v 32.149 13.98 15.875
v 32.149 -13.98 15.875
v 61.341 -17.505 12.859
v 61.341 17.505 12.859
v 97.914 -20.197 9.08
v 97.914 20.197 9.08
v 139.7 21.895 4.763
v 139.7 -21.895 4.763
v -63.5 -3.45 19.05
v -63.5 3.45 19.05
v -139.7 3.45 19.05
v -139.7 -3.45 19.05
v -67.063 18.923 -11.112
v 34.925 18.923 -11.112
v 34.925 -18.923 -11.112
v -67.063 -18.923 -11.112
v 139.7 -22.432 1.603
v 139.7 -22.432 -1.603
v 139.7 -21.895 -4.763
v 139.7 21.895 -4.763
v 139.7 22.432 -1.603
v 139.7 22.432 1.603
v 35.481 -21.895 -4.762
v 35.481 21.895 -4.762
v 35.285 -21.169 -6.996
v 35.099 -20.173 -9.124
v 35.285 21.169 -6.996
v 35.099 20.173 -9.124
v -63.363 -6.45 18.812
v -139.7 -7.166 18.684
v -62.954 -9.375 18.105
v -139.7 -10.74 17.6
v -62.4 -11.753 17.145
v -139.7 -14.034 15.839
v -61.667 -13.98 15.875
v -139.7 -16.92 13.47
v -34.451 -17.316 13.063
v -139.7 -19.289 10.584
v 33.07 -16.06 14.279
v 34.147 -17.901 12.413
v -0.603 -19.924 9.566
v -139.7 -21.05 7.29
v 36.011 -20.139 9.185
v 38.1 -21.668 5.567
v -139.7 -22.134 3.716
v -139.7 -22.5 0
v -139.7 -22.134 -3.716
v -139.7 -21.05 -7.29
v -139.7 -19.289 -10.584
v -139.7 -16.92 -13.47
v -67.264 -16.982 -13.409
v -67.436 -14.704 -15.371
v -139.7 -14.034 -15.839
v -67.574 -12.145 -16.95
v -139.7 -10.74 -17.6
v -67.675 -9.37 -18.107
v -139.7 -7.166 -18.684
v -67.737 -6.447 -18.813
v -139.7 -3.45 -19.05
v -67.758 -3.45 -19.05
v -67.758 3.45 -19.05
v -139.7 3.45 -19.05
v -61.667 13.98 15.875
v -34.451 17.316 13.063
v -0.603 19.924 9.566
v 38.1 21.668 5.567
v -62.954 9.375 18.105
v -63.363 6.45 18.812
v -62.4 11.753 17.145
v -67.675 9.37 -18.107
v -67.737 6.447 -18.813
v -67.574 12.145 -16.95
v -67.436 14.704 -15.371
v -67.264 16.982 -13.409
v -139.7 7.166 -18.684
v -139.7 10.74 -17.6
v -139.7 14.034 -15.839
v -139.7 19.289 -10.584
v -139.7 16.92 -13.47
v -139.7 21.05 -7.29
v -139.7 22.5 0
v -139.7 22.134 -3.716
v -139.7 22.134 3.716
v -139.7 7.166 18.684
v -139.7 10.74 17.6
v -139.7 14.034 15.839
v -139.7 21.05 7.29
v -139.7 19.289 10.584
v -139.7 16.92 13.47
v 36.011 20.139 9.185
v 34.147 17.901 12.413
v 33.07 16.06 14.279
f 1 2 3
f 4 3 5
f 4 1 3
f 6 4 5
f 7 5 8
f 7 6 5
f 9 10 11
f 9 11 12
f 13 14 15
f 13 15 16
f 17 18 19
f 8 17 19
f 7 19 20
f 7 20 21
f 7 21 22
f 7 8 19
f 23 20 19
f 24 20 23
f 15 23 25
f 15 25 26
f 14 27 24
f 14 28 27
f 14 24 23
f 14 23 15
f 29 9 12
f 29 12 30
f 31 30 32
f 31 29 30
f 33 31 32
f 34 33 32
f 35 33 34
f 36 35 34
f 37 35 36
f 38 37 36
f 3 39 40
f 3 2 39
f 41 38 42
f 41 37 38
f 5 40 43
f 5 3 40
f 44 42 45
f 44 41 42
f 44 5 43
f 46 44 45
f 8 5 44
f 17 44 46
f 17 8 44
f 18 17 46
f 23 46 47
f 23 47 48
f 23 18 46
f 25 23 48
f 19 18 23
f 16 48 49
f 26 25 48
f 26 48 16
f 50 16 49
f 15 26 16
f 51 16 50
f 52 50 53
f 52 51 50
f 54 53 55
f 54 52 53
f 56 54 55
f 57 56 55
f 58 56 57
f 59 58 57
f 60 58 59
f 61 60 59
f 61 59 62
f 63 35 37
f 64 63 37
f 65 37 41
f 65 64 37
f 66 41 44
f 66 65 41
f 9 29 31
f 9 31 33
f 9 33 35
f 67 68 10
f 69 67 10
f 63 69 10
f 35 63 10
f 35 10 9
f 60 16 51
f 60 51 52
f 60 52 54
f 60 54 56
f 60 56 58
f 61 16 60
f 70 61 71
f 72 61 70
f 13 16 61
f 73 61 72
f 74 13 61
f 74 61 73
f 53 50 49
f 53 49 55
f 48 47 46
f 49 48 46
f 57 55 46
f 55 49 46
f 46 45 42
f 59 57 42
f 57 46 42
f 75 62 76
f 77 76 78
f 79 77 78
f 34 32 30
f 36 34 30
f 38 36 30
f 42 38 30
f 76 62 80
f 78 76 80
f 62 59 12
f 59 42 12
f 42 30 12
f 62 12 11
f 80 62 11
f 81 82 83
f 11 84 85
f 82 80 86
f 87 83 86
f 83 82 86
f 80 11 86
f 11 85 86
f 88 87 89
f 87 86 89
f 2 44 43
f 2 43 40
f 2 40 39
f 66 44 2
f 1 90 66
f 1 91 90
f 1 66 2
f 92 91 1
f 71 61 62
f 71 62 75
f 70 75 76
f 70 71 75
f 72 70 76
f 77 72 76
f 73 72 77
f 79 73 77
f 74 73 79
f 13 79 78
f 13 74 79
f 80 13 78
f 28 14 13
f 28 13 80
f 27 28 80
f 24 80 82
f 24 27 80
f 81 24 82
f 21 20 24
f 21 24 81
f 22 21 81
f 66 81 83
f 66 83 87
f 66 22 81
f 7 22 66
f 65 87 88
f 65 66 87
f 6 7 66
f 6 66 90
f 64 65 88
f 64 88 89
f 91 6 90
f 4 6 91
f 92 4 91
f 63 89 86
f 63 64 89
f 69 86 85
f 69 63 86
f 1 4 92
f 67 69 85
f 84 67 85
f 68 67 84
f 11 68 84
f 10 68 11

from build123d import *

# Parameters (mm, degrees)
F1_DEPTH      = 139.7
F1_DEPTH_BACK = 139.7
F3_DEPTH      = 22.501
F3_DEPTH_BACK = 22.501
F5_DEPTH      = 22.501
F5_DEPTH_BACK = 22.501


with BuildPart() as f1:
    # F0 (on Right) → F1 (new body, two sides)
    with BuildSketch(Plane.YZ) as f1_sk:
        with BuildLine():
            ThreePointArc((-3.45, 19.05), (-22.5, 0), (-3.45, -19.05))
            Line((-3.45, -19.05), (3.45, -19.05))
            ThreePointArc((3.45, -19.05), (22.5, 0), (3.45, 19.05))
            Line((3.45, 19.05), (-3.45, 19.05))
        make_face()
    extrude(amount=F1_DEPTH)
    extrude(f1_sk.sketch, amount=-F1_DEPTH_BACK)

    # F2 (on Front) → F3 (cut, two sides)
    with BuildSketch(Plane.XZ) as f3_sk:
        Polygon((139.7, 19.05), (-63.5, 19.05), (-61.6669128953, 15.875), (38.1, 5.5668172272), (32.1485679013, 15.875), (139.7, 4.7625), align=None)
    extrude(amount=-F3_DEPTH, mode=Mode.SUBTRACT)
    extrude(f3_sk.sketch, amount=F3_DEPTH_BACK, mode=Mode.SUBTRACT)

    # F4 (on Front) → F5 (cut, two sides)
    with BuildSketch(Plane.XZ) as f5_sk:
        Polygon((139.7, -19.05), (139.7, -4.7625), (35.4805530134, -4.7625), (34.925, -11.1125), (-67.0630954944, -11.1125), (-67.7575367611, -19.05), align=None)
    extrude(amount=-F5_DEPTH, mode=Mode.SUBTRACT)
    extrude(f5_sk.sketch, amount=F5_DEPTH_BACK, mode=Mode.SUBTRACT)


solid = f1.part
